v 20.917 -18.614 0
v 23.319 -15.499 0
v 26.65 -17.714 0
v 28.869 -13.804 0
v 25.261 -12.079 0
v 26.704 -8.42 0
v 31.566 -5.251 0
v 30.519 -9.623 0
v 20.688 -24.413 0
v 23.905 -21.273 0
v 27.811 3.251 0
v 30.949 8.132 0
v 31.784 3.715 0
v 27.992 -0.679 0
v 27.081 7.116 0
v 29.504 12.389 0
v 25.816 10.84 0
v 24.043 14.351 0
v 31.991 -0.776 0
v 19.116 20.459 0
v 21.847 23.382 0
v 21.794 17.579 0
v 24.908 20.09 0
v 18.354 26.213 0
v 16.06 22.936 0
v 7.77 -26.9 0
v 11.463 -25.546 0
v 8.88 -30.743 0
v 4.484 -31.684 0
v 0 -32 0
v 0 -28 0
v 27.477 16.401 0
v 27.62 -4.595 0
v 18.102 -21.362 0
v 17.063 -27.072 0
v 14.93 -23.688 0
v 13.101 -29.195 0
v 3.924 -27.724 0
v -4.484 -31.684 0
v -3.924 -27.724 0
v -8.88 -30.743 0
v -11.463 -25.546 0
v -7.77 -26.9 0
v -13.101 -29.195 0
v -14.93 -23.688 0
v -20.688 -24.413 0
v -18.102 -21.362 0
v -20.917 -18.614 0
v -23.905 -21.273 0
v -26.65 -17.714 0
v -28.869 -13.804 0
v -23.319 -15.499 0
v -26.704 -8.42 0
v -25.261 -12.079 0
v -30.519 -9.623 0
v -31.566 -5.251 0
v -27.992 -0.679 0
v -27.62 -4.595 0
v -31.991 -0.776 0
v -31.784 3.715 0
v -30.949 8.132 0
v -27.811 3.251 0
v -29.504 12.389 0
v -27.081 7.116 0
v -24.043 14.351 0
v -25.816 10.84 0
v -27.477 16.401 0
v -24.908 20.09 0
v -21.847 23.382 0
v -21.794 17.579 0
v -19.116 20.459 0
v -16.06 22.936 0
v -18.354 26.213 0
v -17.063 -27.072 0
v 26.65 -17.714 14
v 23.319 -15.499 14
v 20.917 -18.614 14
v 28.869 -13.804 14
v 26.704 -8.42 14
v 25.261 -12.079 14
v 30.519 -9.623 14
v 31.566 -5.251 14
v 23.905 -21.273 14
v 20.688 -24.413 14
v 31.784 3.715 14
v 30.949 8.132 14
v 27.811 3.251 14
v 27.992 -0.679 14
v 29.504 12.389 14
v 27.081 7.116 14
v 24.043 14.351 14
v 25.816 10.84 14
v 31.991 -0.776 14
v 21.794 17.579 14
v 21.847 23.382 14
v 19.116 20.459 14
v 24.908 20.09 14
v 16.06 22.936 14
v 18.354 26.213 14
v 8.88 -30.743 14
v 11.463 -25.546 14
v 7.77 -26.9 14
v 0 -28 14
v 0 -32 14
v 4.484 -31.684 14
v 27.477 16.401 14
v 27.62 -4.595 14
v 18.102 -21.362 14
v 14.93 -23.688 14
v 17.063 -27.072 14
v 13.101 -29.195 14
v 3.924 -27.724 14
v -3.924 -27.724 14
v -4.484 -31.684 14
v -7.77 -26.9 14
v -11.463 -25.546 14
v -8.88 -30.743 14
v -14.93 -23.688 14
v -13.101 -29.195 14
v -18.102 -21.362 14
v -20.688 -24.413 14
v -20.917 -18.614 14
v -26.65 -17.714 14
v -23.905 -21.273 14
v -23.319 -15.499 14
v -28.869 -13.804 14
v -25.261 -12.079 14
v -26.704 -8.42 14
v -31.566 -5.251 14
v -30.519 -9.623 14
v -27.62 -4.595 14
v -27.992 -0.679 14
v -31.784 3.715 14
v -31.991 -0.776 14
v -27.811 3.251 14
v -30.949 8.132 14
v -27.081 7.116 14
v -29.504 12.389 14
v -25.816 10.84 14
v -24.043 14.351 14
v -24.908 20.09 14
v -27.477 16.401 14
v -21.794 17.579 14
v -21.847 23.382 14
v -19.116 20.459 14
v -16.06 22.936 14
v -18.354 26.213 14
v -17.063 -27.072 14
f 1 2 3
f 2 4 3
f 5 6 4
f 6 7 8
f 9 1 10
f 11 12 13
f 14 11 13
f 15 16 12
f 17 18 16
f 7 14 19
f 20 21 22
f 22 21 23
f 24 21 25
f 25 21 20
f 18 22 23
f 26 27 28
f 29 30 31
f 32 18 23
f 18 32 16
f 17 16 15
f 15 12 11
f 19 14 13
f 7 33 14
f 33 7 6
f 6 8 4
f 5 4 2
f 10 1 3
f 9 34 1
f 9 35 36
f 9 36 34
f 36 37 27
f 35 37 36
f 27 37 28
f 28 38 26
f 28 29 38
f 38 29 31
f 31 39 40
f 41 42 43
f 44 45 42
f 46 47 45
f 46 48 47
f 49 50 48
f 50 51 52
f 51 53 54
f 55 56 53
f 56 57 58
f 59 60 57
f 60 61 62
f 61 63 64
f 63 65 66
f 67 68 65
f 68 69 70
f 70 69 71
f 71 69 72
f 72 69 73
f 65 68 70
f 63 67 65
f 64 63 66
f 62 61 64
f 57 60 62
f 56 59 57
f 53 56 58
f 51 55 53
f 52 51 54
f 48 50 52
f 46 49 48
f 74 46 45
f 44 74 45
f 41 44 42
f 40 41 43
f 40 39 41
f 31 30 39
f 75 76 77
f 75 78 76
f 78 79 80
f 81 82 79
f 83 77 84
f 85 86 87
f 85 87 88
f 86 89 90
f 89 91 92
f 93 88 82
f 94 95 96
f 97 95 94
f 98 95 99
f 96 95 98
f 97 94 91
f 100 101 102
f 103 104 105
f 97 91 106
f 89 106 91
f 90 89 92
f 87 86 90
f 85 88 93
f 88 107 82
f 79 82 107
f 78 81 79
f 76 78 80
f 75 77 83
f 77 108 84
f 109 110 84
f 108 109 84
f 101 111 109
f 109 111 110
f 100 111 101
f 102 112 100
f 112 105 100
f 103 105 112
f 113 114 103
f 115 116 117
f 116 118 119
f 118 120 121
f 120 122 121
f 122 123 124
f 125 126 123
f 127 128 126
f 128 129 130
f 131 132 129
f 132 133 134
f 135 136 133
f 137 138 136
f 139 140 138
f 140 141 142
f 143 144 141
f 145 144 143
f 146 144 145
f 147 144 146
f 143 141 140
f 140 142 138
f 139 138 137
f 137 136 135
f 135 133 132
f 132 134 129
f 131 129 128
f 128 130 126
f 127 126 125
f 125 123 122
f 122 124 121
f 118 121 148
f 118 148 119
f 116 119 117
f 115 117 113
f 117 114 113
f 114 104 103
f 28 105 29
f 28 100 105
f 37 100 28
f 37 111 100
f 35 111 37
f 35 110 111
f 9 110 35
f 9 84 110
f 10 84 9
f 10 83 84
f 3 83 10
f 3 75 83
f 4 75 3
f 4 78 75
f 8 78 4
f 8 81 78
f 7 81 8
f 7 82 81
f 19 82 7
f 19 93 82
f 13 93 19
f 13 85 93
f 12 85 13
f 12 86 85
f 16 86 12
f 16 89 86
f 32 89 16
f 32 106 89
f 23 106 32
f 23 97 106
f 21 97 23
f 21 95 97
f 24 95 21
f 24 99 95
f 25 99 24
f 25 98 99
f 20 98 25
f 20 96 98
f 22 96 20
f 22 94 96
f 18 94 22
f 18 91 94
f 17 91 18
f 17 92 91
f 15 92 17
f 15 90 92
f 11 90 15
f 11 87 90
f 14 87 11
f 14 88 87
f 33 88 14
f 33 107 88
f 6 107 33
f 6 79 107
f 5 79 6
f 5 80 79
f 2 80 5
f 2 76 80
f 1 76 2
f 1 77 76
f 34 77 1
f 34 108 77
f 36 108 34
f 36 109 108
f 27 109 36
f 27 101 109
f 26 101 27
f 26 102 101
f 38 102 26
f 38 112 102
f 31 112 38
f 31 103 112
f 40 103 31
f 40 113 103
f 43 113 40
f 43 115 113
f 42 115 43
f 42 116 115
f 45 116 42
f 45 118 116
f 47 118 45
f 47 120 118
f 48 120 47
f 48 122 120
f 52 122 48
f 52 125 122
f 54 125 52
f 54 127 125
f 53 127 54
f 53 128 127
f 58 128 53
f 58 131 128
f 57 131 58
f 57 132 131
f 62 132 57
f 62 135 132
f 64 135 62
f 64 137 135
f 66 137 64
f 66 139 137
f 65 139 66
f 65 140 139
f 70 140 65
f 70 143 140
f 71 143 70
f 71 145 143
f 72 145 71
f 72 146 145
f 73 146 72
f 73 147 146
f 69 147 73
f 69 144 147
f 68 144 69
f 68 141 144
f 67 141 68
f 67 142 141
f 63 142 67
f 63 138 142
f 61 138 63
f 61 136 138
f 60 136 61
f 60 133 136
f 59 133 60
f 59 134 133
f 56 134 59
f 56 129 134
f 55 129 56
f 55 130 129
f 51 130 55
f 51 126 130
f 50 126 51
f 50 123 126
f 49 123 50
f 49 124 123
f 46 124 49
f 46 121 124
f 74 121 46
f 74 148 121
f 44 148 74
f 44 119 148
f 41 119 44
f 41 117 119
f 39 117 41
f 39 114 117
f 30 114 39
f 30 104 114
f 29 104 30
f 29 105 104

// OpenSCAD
$fn = 32;

// ----------------------------------------------------------------------
// Spring clip: 64 mm outside, 4 mm band, 70 degree opening
// ----------------------------------------------------------------------

// --- parameters (mm) ---
outer_r = 32;             // clip outside radius
inner_r = 28;             // clip bore radius
band = 4;                 // band thickness
clip_w = 14;              // clip width
opening = 70;             // opening angle

clip_profile = [[-18.354, 26.213], [-21.847, 23.382], [-24.908, 20.09], [-27.477, 16.401], [-29.504, 12.389], [-30.949, 8.132], [-31.784, 3.715], [-31.991, -0.776], [-31.566, -5.251], [-30.519, -9.623], [-28.869, -13.804], [-26.65, -17.714], [-23.905, -21.273], [-20.688, -24.413], [-17.063, -27.072], [-13.101, -29.195], [-8.88, -30.743], [-4.484, -31.684], [0, -32], [4.484, -31.684], [8.88, -30.743], [13.101, -29.195], [17.063, -27.072], [20.688, -24.413], [23.905, -21.273], [26.65, -17.714], [28.869, -13.804], [30.519, -9.623], [31.566, -5.251], [31.991, -0.776], [31.784, 3.715], [30.949, 8.132], [29.504, 12.389], [27.477, 16.401], [24.908, 20.09], [21.847, 23.382], [18.354, 26.213], [16.06, 22.936], [19.116, 20.459], [21.794, 17.579], [24.043, 14.351], [25.816, 10.84], [27.081, 7.116], [27.811, 3.251], [27.992, -0.679], [27.62, -4.595], [26.704, -8.42], [25.261, -12.079], [23.319, -15.499], [20.917, -18.614], [18.102, -21.362], [14.93, -23.688], [11.463, -25.546], [7.77, -26.9], [3.924, -27.724], [0, -28], [-3.924, -27.724], [-7.77, -26.9], [-11.463, -25.546], [-14.93, -23.688], [-18.102, -21.362], [-20.917, -18.614], [-23.319, -15.499], [-25.261, -12.079], [-26.704, -8.42], [-27.62, -4.595], [-27.992, -0.679], [-27.811, 3.251], [-27.081, 7.116], [-25.816, 10.84], [-24.043, 14.351], [-21.794, 17.579], [-19.116, 20.459], [-16.06, 22.936]];

difference() {
  union() {
    linear_extrude(height = clip_w) polygon(clip_profile);
  }
}
